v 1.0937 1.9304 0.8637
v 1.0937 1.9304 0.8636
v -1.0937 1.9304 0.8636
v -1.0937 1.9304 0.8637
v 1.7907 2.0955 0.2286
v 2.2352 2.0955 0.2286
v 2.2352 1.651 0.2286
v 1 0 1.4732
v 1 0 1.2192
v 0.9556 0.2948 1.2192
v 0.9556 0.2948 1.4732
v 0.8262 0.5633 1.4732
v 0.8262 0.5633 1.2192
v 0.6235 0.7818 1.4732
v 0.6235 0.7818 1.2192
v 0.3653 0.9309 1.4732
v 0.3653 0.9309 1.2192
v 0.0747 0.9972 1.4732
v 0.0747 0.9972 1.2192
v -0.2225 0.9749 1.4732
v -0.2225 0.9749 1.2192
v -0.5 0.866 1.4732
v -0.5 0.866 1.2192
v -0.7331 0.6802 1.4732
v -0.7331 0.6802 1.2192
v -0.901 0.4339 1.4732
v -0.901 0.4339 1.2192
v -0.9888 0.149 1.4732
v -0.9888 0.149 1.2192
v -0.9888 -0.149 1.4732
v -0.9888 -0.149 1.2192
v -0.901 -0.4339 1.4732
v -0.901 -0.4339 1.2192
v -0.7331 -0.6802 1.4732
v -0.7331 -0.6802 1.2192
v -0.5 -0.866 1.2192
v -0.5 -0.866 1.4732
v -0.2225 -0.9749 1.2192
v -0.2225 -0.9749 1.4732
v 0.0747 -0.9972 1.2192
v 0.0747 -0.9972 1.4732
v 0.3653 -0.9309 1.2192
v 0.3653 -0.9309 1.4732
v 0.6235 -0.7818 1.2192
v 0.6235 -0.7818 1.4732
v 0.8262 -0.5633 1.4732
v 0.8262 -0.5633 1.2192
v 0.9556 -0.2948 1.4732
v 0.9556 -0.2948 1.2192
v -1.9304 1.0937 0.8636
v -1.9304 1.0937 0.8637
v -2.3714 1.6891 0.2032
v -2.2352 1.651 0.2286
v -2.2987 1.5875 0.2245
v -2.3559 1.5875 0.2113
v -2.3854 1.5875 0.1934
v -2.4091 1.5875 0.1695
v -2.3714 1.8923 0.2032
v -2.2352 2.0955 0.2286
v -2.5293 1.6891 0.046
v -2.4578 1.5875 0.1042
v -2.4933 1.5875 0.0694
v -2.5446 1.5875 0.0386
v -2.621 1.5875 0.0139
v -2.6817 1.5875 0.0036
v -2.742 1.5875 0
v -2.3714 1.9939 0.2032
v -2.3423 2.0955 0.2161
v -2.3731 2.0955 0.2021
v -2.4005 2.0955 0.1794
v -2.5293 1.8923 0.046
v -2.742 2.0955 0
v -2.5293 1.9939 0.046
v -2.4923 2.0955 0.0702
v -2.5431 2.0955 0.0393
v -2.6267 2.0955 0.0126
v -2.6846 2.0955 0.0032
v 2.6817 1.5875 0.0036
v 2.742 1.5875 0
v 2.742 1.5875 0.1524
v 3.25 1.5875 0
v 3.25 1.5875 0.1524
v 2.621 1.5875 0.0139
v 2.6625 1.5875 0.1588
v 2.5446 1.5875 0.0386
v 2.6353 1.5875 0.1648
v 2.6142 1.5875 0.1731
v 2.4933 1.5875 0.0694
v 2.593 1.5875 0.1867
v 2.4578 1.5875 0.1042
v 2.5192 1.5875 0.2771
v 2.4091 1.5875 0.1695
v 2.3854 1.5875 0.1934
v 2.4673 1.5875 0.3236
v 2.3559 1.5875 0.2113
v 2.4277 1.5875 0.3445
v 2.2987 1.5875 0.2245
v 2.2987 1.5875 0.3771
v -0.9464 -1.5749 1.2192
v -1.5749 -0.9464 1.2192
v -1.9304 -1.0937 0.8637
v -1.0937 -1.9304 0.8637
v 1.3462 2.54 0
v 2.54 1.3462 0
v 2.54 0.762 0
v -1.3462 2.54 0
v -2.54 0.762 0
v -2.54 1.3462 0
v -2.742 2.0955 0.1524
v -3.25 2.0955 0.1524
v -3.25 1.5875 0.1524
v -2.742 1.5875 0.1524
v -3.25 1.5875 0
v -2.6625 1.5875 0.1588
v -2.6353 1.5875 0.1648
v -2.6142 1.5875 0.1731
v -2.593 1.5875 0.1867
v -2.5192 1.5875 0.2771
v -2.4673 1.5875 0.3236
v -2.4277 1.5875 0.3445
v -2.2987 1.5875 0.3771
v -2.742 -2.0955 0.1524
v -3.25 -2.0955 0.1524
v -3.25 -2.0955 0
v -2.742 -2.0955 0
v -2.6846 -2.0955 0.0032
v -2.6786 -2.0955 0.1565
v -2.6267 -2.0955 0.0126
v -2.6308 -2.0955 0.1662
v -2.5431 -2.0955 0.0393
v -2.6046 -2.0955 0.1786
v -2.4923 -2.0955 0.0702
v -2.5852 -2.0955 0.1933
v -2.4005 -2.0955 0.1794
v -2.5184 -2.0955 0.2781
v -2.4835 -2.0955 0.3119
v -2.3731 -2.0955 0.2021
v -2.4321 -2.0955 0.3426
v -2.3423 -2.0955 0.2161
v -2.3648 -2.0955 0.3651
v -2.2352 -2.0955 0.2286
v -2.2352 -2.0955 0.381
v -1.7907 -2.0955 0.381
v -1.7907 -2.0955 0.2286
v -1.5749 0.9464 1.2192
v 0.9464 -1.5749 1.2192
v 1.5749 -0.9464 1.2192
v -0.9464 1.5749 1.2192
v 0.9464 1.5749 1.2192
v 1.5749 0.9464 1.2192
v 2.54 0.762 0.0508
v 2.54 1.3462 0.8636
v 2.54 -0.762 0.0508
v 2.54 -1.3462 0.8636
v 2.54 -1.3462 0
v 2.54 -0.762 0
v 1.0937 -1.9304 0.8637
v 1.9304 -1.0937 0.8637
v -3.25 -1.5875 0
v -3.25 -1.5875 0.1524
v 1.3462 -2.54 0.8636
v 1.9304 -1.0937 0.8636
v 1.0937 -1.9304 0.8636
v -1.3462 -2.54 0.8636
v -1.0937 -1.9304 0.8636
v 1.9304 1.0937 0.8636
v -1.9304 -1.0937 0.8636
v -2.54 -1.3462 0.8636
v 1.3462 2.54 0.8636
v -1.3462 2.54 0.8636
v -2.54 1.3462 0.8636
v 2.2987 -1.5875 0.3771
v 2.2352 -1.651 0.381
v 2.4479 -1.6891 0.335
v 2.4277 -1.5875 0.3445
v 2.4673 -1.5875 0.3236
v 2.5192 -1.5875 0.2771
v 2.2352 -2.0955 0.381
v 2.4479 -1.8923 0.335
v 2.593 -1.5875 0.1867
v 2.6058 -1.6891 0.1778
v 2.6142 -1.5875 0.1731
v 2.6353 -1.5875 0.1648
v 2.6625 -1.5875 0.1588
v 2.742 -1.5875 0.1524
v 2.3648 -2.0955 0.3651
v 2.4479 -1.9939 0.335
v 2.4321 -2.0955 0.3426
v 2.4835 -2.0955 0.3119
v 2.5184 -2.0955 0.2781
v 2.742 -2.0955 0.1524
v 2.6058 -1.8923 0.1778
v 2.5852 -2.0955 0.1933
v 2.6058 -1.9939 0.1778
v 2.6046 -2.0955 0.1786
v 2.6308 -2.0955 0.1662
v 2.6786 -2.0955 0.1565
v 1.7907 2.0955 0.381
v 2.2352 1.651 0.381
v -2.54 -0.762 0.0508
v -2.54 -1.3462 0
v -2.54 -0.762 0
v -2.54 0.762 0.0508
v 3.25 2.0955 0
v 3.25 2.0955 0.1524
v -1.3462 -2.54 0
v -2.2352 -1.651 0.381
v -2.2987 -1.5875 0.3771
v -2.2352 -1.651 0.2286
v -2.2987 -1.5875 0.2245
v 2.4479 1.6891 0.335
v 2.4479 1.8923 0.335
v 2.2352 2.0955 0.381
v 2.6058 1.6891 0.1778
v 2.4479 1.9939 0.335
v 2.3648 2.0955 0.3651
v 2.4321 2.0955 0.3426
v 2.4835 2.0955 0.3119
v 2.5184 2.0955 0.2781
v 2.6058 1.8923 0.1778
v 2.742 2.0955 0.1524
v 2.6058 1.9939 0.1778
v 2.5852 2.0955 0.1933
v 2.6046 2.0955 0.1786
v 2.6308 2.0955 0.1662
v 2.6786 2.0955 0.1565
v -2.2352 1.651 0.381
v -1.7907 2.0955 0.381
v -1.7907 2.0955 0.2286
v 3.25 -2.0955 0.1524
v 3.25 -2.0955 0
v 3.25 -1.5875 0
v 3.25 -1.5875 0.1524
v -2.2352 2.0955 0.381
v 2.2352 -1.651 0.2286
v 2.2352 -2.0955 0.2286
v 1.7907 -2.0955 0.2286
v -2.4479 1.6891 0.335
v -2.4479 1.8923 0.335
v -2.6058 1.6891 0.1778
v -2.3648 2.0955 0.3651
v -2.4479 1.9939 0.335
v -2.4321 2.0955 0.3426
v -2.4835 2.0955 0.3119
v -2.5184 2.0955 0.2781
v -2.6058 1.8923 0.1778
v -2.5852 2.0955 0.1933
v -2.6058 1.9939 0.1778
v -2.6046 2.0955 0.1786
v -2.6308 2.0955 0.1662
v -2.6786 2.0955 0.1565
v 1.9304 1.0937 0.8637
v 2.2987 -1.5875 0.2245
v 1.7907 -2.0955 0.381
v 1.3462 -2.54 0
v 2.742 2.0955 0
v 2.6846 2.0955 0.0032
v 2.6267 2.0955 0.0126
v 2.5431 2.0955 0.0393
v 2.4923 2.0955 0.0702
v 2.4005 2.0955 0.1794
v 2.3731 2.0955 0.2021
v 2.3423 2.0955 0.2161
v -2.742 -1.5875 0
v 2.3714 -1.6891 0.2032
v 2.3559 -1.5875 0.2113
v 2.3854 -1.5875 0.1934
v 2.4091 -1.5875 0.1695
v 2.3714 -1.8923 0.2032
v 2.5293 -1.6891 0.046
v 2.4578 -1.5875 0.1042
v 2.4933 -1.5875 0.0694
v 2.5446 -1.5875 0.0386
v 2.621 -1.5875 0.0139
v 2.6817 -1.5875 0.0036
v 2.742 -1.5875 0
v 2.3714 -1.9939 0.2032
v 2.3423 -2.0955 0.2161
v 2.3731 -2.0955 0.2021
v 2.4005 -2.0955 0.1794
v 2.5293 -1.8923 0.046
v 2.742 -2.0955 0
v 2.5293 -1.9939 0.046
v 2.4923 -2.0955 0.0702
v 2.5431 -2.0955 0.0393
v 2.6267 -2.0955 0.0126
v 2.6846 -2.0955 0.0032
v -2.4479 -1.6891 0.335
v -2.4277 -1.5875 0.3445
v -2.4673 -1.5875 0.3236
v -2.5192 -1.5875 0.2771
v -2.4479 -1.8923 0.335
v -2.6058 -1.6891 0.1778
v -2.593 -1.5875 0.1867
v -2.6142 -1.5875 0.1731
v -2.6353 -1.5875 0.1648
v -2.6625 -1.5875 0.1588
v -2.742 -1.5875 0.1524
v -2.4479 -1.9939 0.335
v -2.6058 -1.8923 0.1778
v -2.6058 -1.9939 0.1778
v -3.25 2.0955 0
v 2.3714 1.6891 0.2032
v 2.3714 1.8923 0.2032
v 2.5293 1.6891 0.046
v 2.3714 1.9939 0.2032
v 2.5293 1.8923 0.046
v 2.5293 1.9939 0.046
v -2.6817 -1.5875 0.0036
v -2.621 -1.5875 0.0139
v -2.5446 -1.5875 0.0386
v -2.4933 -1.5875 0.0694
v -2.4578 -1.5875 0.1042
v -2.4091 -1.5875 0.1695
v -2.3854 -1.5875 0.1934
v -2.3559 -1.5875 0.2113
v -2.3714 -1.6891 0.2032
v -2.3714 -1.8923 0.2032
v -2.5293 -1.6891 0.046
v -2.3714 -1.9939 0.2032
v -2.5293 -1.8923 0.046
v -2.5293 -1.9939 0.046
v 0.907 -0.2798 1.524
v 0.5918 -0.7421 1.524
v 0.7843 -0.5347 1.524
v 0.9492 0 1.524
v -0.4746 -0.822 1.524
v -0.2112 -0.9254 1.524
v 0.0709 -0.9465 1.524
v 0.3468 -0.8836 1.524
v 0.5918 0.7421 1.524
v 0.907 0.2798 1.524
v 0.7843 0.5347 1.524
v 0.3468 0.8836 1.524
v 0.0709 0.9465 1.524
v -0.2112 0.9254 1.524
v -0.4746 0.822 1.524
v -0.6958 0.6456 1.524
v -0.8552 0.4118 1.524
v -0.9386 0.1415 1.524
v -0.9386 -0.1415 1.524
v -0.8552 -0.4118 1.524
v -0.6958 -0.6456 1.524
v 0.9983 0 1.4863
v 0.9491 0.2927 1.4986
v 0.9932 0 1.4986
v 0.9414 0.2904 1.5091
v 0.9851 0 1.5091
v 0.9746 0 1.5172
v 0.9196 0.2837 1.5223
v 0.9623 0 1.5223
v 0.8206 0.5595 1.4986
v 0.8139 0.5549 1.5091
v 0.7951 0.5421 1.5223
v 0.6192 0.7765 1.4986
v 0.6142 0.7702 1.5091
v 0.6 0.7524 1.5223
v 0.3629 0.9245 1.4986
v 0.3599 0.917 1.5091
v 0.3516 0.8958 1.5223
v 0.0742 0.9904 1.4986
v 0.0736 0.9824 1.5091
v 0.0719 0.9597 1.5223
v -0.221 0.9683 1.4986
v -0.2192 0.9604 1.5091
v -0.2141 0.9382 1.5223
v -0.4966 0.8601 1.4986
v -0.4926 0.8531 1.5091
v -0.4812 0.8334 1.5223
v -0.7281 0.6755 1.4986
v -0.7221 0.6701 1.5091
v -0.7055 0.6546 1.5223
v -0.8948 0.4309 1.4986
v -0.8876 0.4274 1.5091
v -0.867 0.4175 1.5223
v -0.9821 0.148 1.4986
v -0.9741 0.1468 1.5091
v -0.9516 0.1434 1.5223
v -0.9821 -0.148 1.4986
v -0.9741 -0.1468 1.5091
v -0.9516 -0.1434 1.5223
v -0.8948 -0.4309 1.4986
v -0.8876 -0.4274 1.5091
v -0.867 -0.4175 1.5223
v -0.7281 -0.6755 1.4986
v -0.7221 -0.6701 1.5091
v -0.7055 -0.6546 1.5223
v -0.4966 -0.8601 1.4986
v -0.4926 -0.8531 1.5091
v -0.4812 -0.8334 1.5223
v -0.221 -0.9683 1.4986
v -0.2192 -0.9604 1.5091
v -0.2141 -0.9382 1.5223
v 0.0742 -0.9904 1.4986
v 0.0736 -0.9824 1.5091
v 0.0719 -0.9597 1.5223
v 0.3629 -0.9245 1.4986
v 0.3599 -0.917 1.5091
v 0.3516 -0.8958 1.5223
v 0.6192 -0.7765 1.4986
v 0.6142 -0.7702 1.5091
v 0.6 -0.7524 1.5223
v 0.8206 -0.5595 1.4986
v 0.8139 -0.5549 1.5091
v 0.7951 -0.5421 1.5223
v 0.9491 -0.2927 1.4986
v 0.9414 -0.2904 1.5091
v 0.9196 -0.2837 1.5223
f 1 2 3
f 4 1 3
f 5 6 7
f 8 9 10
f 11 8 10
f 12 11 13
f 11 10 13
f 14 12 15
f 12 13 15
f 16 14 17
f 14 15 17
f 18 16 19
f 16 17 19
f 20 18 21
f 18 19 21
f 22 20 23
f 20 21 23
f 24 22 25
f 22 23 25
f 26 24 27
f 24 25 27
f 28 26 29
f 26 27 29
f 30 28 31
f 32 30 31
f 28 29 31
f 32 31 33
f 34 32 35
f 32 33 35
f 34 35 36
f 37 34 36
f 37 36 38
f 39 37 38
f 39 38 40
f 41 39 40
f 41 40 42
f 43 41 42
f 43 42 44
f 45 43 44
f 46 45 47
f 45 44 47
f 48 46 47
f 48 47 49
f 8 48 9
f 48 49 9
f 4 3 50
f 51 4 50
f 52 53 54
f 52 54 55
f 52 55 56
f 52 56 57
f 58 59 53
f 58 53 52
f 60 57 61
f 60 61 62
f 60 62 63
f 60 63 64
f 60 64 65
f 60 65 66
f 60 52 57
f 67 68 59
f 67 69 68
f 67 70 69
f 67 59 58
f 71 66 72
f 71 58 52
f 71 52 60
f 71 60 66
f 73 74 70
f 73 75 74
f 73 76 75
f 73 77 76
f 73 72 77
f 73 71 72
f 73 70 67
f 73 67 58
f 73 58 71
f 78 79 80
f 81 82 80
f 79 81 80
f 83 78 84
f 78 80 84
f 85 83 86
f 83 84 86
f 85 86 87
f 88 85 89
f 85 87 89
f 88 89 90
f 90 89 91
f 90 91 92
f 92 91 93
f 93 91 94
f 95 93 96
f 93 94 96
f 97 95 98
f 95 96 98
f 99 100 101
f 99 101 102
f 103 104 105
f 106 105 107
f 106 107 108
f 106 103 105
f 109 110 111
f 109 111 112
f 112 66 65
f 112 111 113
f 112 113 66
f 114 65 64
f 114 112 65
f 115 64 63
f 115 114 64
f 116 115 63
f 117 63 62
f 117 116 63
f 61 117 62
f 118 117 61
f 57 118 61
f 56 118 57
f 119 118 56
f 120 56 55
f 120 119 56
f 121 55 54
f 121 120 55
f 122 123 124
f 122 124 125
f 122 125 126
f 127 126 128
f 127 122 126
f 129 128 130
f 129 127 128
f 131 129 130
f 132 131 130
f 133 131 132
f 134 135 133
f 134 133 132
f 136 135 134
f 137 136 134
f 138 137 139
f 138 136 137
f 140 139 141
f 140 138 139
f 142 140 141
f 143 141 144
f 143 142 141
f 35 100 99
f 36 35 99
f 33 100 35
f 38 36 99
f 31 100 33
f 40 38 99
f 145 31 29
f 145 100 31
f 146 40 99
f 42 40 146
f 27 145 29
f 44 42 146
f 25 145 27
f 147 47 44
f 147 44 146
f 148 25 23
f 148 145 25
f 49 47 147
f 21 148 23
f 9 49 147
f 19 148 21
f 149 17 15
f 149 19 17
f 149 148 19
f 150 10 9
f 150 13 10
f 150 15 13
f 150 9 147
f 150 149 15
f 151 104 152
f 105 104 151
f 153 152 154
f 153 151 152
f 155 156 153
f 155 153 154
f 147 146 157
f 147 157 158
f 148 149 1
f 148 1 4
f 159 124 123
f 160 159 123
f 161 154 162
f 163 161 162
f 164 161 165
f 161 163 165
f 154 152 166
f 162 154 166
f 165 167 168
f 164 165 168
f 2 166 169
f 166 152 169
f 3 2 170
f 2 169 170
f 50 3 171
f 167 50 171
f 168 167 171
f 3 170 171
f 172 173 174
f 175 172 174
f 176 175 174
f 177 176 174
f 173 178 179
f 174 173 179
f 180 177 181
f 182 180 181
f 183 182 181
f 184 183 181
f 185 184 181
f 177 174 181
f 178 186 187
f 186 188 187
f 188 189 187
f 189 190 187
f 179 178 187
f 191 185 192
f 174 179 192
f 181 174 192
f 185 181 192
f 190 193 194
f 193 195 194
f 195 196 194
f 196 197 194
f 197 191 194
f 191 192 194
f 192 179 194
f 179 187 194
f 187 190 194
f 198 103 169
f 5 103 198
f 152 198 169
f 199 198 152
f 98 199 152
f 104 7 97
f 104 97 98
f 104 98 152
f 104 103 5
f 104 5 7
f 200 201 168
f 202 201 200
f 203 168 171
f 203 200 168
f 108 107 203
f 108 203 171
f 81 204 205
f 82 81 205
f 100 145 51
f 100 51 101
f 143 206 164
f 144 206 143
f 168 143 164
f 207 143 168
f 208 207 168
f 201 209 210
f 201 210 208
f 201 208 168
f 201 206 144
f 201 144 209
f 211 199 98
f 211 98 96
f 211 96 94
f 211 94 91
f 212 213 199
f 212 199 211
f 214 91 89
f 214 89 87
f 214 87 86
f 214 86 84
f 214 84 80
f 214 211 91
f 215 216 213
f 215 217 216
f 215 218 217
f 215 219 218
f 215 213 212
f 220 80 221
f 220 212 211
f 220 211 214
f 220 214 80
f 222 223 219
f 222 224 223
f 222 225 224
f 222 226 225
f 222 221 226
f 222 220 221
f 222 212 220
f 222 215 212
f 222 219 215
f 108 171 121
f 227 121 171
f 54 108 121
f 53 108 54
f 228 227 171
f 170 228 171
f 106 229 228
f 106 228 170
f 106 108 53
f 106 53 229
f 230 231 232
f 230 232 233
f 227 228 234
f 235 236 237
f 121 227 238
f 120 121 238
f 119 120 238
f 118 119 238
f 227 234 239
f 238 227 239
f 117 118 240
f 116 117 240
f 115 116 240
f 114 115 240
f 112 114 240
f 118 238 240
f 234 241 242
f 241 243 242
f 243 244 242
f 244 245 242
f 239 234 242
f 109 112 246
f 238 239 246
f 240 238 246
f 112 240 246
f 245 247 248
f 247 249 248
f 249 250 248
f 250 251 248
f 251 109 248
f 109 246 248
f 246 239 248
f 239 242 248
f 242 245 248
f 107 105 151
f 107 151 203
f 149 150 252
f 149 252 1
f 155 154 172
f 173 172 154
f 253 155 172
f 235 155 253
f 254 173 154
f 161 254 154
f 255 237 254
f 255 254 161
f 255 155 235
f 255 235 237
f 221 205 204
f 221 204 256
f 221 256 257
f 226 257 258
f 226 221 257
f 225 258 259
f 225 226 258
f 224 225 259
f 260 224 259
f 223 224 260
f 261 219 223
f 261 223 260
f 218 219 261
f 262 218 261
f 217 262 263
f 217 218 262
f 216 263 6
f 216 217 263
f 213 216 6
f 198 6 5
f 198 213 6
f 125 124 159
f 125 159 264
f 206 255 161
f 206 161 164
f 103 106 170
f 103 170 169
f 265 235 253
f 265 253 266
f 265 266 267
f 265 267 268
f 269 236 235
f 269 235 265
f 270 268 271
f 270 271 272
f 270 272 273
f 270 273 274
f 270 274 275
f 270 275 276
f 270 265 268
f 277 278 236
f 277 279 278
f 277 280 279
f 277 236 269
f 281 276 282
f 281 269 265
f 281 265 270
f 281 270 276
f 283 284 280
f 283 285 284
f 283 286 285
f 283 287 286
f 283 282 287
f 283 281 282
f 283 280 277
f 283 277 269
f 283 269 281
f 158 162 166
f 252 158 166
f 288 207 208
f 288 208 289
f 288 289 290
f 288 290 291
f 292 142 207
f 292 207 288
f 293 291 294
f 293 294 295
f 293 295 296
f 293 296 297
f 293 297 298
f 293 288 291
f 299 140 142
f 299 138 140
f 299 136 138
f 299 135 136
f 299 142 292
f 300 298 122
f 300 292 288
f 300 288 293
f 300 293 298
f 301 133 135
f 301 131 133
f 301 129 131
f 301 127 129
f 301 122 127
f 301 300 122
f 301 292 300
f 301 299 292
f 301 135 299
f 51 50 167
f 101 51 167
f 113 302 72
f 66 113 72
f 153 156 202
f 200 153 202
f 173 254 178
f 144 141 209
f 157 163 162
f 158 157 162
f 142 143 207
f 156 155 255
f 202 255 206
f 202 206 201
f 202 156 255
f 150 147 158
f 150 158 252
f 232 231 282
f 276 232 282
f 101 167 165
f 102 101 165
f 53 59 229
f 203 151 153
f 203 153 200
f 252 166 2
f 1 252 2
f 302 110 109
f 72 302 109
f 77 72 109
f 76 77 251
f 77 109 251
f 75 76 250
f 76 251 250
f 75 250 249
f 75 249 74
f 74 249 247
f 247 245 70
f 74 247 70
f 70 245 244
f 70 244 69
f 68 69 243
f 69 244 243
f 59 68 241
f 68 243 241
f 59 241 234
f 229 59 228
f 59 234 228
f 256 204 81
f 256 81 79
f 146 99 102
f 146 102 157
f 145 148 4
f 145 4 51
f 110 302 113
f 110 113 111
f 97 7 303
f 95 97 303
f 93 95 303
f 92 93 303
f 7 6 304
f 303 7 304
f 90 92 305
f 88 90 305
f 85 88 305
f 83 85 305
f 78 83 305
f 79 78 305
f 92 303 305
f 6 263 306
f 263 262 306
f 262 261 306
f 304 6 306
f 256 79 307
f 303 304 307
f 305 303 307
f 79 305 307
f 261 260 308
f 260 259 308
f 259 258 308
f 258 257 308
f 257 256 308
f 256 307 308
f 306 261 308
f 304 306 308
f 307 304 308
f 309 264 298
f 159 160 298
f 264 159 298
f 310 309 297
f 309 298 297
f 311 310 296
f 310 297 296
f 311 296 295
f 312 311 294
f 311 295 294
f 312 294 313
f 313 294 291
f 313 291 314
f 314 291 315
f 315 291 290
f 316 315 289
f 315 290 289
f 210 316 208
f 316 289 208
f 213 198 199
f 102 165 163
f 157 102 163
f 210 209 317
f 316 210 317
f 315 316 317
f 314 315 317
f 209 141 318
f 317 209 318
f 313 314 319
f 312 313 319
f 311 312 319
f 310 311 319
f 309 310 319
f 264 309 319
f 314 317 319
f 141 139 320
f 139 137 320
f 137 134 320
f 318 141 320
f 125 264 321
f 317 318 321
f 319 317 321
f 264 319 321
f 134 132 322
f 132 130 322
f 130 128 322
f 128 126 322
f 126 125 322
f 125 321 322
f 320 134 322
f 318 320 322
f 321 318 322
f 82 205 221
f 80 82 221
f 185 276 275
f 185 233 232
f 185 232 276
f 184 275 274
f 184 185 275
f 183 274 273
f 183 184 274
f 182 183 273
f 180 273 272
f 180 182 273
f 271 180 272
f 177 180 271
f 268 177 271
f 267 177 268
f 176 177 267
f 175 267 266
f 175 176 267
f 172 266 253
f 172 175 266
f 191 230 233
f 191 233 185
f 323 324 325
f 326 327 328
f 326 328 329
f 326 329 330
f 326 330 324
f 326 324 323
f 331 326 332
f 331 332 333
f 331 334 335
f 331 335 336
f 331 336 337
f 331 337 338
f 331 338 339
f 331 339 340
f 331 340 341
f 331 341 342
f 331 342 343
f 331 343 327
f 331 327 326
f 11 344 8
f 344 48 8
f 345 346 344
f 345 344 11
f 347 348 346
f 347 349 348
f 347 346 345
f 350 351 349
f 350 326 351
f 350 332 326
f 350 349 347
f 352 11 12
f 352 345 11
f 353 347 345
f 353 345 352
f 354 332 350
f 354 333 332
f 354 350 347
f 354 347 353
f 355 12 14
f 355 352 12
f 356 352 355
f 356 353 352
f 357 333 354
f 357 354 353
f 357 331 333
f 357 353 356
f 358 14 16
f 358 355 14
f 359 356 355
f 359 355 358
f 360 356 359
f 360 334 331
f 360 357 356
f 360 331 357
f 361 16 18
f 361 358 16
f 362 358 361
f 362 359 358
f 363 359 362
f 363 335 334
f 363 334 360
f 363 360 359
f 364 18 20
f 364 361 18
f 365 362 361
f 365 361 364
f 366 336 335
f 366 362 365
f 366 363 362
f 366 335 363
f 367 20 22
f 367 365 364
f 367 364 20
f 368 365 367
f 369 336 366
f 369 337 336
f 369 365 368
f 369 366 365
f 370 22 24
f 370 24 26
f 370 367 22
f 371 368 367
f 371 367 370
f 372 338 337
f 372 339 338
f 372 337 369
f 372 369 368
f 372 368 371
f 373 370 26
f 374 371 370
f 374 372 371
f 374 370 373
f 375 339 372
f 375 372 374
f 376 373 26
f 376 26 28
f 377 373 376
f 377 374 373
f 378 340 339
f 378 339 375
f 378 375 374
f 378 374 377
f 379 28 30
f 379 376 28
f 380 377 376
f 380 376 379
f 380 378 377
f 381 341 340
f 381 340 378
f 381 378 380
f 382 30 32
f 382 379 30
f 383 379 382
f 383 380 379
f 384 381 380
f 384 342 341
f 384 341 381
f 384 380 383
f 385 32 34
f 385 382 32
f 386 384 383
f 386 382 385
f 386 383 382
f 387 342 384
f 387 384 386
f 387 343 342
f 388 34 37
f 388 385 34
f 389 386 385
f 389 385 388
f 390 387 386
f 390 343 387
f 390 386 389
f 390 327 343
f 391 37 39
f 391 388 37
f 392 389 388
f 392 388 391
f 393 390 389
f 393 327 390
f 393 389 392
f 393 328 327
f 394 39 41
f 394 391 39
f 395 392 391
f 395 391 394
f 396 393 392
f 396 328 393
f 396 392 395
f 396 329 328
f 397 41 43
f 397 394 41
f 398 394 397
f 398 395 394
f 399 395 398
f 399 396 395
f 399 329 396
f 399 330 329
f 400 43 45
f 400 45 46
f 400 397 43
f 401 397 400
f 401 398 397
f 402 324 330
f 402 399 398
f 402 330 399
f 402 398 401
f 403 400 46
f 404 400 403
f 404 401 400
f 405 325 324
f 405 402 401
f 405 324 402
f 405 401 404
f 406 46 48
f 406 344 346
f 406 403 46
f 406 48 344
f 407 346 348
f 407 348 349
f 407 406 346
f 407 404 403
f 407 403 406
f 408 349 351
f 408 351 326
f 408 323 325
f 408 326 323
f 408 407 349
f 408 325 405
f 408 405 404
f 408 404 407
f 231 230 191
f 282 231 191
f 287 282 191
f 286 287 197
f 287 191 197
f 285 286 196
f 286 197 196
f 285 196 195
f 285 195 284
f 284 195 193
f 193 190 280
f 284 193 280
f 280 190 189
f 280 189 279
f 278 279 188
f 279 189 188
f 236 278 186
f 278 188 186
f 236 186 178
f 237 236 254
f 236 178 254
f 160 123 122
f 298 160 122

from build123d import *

# Parameters (mm, degrees)
BASE_DEPTH              = 0.8636
TIER1_DEPTH             = 0.3556
CHAMFER1_SIZE           = 0.3556
SKETCH3_R               = 1
BUTTON_DEPTH            = 0.3048
BUTTONC_R               = 0.0508
SKETCH4_W               = 5.08
SKETCH4_H               = 1.524
BOTTOM_CUT_DEPTH        = 0.0508
PINS_START              = -0.4445
SKETCH6_W               = 0.508
SKETCH6_H               = 0.1524
PINS_DEPTH              = 0.508
MIRROR2_START           = -0.4445
MIRROR2_COPY_1_SKETCH_W = 0.508
MIRROR2_COPY_1_SKETCH_H = 0.1524
MIRROR2_COPY_1_DEPTH    = 0.508


with BuildPart() as part:
    # Sketch1 → Base (new body)
    with BuildSketch(Plane.XY):
        Polygon((-1.3462, 2.54), (1.3462, 2.54), (2.54, 1.3462), (2.54, -1.3462), (1.3462, -2.54), (-1.3462, -2.54), (-2.54, -1.3462), (-2.54, 1.3462), align=None)
    extrude(amount=BASE_DEPTH)

    # Sketch2 → Tier1 (add)
    with BuildSketch(Plane.XY.offset(0.8636)):
        Polygon((-1.093695412, 1.9304), (-1.9304, 1.093695412), (-1.9304, -1.093695412), (-1.093695412, -1.9304), (1.093695412, -1.9304), (1.9304, -1.093695412), (1.9304, 1.093695412), (1.093695412, 1.9304), align=None)
    extrude(amount=TIER1_DEPTH)

    # Chamfer1
    chamfer1_edges = [part.edges().sort_by_distance(p)[0] for p in [
        (-1.512047706, 1.512047706, 1.2192),
        (0, 1.9304, 1.2192),
        (1.512047706, 1.512047706, 1.2192),
        (1.9304, 0, 1.2192),
        (1.512047706, -1.512047706, 1.2192),
        (0, -1.9304, 1.2192),
        (-1.512047706, -1.512047706, 1.2192),
        (-1.9304, 0, 1.2192),
    ]]
    chamfer(chamfer1_edges, length=CHAMFER1_SIZE - 0.0001)  # a hair under: the kernel refuses the full size

    # Sketch3 → Button (add)
    with BuildSketch(Plane.XY.offset(1.2192)):
        Circle(SKETCH3_R)
    extrude(amount=BUTTON_DEPTH)

    # ButtonC
    buttonc_edges = [part.edges().sort_by_distance(p)[0] for p in [
        (-1, 0, 1.524),
    ]]
    fillet(buttonc_edges, radius=BUTTONC_R)

    # Sketch4 → Bottom cut (cut)
    with BuildSketch(Plane(origin=(0, 0, 0), x_dir=(-1, 0, 0), z_dir=(0, 0, -1))):
        Rectangle(SKETCH4_W, SKETCH4_H)
    extrude(amount=-BOTTOM_CUT_DEPTH, mode=Mode.SUBTRACT)

    # Sketch6 → pins (add)
    with BuildSketch(Plane.XZ.offset(2.54).offset(PINS_START)):
        with Locations((-1.0922, 0.3048)):
            Rectangle(SKETCH6_W, SKETCH6_H)
        Polygon((-1.3462, 0.2286), (-1.3462, 0.381), (-2.2352, 0.381), (-2.2352, 0.3048), (-2.2352, 0.2286), align=None)
        with BuildLine():
            Line((-2.2352, 0.3048), (-2.2352, 0.381))
            add(Edge.make_bspline(
                [(-2.2352, 0.381), (-2.307735088, 0.381), (-2.477008689, 0.347316172), (-2.556176281, 0.222815828), (-2.591192004, 0.183226461), (-2.642048799, 0.15910292), (-2.712296659, 0.1524), (-2.742, 0.1524)],
                knots=[0, 0, 0, 0, 0.25, 0.5, 0.75, 0.875, 1, 1, 1, 1], degree=3))
            Line((-2.742, 0.1524), (-2.742, 0.0762))
            add(Edge.make_bspline(
                [(-2.2352, 0.3048), (-2.573866667, 0.3048), (-2.403333333, 0.0762), (-2.742, 0.0762)],
                knots=[0, 0, 0, 0, 1, 1, 1, 1], degree=3))
        make_face()
        with BuildLine():
            Line((-2.2352, 0.2286), (-2.2352, 0.3048))
            add(Edge.make_bspline(
                [(-2.2352, 0.3048), (-2.573866667, 0.3048), (-2.403333333, 0.0762), (-2.742, 0.0762)],
                knots=[0, 0, 0, 0, 1, 1, 1, 1], degree=3))
            Line((-2.742, 0.0762), (-2.742, 0))
            add(Edge.make_bspline(
                [(-2.2352, 0.2286), (-2.264903341, 0.2286), (-2.335151201, 0.22189708), (-2.386007996, 0.197773539), (-2.421023719, 0.158184172), (-2.500191311, 0.033683828), (-2.669464912, 0), (-2.742, 0)],
                knots=[0, 0, 0, 0, 0.125, 0.25, 0.5, 0.75, 1, 1, 1, 1], degree=3))
        make_face()
        with Locations((-2.996, 0.0762)):
            Rectangle(SKETCH6_W, SKETCH6_H)
    pins = extrude(amount=-PINS_DEPTH)

    # pins2: pins across plane
    add(pins.mirror(Plane.ZX))

    # Mirror2: pins across plane
    add(pins.mirror(Plane(origin=(0, 0, 0), x_dir=(0, 0, 1), z_dir=(1, 0, 0))))

    # Mirror2 copy 1 sketch → Mirror2 copy 1 (add)
    with BuildSketch(Plane(origin=(0, 2.54, 0), x_dir=(-1, 0, 0), z_dir=(0, 1, 0)).offset(MIRROR2_START)):
        with Locations((-1.0922, 0.3048)):
            Rectangle(MIRROR2_COPY_1_SKETCH_W, MIRROR2_COPY_1_SKETCH_H)
        Polygon((-1.3462, 0.2286), (-1.3462, 0.381), (-2.2352, 0.381), (-2.2352, 0.3048), (-2.2352, 0.2286), align=None)
        with BuildLine():
            Line((-2.2352, 0.3048), (-2.2352, 0.381))
            add(Edge.make_bspline(
                [(-2.2352, 0.381), (-2.307735088, 0.381), (-2.477008689, 0.347316172), (-2.556176281, 0.222815828), (-2.591192004, 0.183226461), (-2.642048799, 0.15910292), (-2.712296659, 0.1524), (-2.742, 0.1524)],
                knots=[0, 0, 0, 0, 0.25, 0.5, 0.75, 0.875, 1, 1, 1, 1], degree=3))
            Line((-2.742, 0.1524), (-2.742, 0.0762))
            add(Edge.make_bspline(
                [(-2.2352, 0.3048), (-2.573866667, 0.3048), (-2.403333333, 0.0762), (-2.742, 0.0762)],
                knots=[0, 0, 0, 0, 1, 1, 1, 1], degree=3))
        make_face()
        with BuildLine():
            Line((-2.2352, 0.2286), (-2.2352, 0.3048))
            add(Edge.make_bspline(
                [(-2.2352, 0.3048), (-2.573866667, 0.3048), (-2.403333333, 0.0762), (-2.742, 0.0762)],
                knots=[0, 0, 0, 0, 1, 1, 1, 1], degree=3))
            Line((-2.742, 0.0762), (-2.742, 0))
            add(Edge.make_bspline(
                [(-2.2352, 0.2286), (-2.264903341, 0.2286), (-2.335151201, 0.22189708), (-2.386007996, 0.197773539), (-2.421023719, 0.158184172), (-2.500191311, 0.033683828), (-2.669464912, 0), (-2.742, 0)],
                knots=[0, 0, 0, 0, 0.125, 0.25, 0.5, 0.75, 1, 1, 1, 1], degree=3))
        make_face()
        with Locations((-2.996, 0.0762)):
            Rectangle(MIRROR2_COPY_1_SKETCH_W, MIRROR2_COPY_1_SKETCH_H)
    extrude(amount=-MIRROR2_COPY_1_DEPTH)


solid = part.part
